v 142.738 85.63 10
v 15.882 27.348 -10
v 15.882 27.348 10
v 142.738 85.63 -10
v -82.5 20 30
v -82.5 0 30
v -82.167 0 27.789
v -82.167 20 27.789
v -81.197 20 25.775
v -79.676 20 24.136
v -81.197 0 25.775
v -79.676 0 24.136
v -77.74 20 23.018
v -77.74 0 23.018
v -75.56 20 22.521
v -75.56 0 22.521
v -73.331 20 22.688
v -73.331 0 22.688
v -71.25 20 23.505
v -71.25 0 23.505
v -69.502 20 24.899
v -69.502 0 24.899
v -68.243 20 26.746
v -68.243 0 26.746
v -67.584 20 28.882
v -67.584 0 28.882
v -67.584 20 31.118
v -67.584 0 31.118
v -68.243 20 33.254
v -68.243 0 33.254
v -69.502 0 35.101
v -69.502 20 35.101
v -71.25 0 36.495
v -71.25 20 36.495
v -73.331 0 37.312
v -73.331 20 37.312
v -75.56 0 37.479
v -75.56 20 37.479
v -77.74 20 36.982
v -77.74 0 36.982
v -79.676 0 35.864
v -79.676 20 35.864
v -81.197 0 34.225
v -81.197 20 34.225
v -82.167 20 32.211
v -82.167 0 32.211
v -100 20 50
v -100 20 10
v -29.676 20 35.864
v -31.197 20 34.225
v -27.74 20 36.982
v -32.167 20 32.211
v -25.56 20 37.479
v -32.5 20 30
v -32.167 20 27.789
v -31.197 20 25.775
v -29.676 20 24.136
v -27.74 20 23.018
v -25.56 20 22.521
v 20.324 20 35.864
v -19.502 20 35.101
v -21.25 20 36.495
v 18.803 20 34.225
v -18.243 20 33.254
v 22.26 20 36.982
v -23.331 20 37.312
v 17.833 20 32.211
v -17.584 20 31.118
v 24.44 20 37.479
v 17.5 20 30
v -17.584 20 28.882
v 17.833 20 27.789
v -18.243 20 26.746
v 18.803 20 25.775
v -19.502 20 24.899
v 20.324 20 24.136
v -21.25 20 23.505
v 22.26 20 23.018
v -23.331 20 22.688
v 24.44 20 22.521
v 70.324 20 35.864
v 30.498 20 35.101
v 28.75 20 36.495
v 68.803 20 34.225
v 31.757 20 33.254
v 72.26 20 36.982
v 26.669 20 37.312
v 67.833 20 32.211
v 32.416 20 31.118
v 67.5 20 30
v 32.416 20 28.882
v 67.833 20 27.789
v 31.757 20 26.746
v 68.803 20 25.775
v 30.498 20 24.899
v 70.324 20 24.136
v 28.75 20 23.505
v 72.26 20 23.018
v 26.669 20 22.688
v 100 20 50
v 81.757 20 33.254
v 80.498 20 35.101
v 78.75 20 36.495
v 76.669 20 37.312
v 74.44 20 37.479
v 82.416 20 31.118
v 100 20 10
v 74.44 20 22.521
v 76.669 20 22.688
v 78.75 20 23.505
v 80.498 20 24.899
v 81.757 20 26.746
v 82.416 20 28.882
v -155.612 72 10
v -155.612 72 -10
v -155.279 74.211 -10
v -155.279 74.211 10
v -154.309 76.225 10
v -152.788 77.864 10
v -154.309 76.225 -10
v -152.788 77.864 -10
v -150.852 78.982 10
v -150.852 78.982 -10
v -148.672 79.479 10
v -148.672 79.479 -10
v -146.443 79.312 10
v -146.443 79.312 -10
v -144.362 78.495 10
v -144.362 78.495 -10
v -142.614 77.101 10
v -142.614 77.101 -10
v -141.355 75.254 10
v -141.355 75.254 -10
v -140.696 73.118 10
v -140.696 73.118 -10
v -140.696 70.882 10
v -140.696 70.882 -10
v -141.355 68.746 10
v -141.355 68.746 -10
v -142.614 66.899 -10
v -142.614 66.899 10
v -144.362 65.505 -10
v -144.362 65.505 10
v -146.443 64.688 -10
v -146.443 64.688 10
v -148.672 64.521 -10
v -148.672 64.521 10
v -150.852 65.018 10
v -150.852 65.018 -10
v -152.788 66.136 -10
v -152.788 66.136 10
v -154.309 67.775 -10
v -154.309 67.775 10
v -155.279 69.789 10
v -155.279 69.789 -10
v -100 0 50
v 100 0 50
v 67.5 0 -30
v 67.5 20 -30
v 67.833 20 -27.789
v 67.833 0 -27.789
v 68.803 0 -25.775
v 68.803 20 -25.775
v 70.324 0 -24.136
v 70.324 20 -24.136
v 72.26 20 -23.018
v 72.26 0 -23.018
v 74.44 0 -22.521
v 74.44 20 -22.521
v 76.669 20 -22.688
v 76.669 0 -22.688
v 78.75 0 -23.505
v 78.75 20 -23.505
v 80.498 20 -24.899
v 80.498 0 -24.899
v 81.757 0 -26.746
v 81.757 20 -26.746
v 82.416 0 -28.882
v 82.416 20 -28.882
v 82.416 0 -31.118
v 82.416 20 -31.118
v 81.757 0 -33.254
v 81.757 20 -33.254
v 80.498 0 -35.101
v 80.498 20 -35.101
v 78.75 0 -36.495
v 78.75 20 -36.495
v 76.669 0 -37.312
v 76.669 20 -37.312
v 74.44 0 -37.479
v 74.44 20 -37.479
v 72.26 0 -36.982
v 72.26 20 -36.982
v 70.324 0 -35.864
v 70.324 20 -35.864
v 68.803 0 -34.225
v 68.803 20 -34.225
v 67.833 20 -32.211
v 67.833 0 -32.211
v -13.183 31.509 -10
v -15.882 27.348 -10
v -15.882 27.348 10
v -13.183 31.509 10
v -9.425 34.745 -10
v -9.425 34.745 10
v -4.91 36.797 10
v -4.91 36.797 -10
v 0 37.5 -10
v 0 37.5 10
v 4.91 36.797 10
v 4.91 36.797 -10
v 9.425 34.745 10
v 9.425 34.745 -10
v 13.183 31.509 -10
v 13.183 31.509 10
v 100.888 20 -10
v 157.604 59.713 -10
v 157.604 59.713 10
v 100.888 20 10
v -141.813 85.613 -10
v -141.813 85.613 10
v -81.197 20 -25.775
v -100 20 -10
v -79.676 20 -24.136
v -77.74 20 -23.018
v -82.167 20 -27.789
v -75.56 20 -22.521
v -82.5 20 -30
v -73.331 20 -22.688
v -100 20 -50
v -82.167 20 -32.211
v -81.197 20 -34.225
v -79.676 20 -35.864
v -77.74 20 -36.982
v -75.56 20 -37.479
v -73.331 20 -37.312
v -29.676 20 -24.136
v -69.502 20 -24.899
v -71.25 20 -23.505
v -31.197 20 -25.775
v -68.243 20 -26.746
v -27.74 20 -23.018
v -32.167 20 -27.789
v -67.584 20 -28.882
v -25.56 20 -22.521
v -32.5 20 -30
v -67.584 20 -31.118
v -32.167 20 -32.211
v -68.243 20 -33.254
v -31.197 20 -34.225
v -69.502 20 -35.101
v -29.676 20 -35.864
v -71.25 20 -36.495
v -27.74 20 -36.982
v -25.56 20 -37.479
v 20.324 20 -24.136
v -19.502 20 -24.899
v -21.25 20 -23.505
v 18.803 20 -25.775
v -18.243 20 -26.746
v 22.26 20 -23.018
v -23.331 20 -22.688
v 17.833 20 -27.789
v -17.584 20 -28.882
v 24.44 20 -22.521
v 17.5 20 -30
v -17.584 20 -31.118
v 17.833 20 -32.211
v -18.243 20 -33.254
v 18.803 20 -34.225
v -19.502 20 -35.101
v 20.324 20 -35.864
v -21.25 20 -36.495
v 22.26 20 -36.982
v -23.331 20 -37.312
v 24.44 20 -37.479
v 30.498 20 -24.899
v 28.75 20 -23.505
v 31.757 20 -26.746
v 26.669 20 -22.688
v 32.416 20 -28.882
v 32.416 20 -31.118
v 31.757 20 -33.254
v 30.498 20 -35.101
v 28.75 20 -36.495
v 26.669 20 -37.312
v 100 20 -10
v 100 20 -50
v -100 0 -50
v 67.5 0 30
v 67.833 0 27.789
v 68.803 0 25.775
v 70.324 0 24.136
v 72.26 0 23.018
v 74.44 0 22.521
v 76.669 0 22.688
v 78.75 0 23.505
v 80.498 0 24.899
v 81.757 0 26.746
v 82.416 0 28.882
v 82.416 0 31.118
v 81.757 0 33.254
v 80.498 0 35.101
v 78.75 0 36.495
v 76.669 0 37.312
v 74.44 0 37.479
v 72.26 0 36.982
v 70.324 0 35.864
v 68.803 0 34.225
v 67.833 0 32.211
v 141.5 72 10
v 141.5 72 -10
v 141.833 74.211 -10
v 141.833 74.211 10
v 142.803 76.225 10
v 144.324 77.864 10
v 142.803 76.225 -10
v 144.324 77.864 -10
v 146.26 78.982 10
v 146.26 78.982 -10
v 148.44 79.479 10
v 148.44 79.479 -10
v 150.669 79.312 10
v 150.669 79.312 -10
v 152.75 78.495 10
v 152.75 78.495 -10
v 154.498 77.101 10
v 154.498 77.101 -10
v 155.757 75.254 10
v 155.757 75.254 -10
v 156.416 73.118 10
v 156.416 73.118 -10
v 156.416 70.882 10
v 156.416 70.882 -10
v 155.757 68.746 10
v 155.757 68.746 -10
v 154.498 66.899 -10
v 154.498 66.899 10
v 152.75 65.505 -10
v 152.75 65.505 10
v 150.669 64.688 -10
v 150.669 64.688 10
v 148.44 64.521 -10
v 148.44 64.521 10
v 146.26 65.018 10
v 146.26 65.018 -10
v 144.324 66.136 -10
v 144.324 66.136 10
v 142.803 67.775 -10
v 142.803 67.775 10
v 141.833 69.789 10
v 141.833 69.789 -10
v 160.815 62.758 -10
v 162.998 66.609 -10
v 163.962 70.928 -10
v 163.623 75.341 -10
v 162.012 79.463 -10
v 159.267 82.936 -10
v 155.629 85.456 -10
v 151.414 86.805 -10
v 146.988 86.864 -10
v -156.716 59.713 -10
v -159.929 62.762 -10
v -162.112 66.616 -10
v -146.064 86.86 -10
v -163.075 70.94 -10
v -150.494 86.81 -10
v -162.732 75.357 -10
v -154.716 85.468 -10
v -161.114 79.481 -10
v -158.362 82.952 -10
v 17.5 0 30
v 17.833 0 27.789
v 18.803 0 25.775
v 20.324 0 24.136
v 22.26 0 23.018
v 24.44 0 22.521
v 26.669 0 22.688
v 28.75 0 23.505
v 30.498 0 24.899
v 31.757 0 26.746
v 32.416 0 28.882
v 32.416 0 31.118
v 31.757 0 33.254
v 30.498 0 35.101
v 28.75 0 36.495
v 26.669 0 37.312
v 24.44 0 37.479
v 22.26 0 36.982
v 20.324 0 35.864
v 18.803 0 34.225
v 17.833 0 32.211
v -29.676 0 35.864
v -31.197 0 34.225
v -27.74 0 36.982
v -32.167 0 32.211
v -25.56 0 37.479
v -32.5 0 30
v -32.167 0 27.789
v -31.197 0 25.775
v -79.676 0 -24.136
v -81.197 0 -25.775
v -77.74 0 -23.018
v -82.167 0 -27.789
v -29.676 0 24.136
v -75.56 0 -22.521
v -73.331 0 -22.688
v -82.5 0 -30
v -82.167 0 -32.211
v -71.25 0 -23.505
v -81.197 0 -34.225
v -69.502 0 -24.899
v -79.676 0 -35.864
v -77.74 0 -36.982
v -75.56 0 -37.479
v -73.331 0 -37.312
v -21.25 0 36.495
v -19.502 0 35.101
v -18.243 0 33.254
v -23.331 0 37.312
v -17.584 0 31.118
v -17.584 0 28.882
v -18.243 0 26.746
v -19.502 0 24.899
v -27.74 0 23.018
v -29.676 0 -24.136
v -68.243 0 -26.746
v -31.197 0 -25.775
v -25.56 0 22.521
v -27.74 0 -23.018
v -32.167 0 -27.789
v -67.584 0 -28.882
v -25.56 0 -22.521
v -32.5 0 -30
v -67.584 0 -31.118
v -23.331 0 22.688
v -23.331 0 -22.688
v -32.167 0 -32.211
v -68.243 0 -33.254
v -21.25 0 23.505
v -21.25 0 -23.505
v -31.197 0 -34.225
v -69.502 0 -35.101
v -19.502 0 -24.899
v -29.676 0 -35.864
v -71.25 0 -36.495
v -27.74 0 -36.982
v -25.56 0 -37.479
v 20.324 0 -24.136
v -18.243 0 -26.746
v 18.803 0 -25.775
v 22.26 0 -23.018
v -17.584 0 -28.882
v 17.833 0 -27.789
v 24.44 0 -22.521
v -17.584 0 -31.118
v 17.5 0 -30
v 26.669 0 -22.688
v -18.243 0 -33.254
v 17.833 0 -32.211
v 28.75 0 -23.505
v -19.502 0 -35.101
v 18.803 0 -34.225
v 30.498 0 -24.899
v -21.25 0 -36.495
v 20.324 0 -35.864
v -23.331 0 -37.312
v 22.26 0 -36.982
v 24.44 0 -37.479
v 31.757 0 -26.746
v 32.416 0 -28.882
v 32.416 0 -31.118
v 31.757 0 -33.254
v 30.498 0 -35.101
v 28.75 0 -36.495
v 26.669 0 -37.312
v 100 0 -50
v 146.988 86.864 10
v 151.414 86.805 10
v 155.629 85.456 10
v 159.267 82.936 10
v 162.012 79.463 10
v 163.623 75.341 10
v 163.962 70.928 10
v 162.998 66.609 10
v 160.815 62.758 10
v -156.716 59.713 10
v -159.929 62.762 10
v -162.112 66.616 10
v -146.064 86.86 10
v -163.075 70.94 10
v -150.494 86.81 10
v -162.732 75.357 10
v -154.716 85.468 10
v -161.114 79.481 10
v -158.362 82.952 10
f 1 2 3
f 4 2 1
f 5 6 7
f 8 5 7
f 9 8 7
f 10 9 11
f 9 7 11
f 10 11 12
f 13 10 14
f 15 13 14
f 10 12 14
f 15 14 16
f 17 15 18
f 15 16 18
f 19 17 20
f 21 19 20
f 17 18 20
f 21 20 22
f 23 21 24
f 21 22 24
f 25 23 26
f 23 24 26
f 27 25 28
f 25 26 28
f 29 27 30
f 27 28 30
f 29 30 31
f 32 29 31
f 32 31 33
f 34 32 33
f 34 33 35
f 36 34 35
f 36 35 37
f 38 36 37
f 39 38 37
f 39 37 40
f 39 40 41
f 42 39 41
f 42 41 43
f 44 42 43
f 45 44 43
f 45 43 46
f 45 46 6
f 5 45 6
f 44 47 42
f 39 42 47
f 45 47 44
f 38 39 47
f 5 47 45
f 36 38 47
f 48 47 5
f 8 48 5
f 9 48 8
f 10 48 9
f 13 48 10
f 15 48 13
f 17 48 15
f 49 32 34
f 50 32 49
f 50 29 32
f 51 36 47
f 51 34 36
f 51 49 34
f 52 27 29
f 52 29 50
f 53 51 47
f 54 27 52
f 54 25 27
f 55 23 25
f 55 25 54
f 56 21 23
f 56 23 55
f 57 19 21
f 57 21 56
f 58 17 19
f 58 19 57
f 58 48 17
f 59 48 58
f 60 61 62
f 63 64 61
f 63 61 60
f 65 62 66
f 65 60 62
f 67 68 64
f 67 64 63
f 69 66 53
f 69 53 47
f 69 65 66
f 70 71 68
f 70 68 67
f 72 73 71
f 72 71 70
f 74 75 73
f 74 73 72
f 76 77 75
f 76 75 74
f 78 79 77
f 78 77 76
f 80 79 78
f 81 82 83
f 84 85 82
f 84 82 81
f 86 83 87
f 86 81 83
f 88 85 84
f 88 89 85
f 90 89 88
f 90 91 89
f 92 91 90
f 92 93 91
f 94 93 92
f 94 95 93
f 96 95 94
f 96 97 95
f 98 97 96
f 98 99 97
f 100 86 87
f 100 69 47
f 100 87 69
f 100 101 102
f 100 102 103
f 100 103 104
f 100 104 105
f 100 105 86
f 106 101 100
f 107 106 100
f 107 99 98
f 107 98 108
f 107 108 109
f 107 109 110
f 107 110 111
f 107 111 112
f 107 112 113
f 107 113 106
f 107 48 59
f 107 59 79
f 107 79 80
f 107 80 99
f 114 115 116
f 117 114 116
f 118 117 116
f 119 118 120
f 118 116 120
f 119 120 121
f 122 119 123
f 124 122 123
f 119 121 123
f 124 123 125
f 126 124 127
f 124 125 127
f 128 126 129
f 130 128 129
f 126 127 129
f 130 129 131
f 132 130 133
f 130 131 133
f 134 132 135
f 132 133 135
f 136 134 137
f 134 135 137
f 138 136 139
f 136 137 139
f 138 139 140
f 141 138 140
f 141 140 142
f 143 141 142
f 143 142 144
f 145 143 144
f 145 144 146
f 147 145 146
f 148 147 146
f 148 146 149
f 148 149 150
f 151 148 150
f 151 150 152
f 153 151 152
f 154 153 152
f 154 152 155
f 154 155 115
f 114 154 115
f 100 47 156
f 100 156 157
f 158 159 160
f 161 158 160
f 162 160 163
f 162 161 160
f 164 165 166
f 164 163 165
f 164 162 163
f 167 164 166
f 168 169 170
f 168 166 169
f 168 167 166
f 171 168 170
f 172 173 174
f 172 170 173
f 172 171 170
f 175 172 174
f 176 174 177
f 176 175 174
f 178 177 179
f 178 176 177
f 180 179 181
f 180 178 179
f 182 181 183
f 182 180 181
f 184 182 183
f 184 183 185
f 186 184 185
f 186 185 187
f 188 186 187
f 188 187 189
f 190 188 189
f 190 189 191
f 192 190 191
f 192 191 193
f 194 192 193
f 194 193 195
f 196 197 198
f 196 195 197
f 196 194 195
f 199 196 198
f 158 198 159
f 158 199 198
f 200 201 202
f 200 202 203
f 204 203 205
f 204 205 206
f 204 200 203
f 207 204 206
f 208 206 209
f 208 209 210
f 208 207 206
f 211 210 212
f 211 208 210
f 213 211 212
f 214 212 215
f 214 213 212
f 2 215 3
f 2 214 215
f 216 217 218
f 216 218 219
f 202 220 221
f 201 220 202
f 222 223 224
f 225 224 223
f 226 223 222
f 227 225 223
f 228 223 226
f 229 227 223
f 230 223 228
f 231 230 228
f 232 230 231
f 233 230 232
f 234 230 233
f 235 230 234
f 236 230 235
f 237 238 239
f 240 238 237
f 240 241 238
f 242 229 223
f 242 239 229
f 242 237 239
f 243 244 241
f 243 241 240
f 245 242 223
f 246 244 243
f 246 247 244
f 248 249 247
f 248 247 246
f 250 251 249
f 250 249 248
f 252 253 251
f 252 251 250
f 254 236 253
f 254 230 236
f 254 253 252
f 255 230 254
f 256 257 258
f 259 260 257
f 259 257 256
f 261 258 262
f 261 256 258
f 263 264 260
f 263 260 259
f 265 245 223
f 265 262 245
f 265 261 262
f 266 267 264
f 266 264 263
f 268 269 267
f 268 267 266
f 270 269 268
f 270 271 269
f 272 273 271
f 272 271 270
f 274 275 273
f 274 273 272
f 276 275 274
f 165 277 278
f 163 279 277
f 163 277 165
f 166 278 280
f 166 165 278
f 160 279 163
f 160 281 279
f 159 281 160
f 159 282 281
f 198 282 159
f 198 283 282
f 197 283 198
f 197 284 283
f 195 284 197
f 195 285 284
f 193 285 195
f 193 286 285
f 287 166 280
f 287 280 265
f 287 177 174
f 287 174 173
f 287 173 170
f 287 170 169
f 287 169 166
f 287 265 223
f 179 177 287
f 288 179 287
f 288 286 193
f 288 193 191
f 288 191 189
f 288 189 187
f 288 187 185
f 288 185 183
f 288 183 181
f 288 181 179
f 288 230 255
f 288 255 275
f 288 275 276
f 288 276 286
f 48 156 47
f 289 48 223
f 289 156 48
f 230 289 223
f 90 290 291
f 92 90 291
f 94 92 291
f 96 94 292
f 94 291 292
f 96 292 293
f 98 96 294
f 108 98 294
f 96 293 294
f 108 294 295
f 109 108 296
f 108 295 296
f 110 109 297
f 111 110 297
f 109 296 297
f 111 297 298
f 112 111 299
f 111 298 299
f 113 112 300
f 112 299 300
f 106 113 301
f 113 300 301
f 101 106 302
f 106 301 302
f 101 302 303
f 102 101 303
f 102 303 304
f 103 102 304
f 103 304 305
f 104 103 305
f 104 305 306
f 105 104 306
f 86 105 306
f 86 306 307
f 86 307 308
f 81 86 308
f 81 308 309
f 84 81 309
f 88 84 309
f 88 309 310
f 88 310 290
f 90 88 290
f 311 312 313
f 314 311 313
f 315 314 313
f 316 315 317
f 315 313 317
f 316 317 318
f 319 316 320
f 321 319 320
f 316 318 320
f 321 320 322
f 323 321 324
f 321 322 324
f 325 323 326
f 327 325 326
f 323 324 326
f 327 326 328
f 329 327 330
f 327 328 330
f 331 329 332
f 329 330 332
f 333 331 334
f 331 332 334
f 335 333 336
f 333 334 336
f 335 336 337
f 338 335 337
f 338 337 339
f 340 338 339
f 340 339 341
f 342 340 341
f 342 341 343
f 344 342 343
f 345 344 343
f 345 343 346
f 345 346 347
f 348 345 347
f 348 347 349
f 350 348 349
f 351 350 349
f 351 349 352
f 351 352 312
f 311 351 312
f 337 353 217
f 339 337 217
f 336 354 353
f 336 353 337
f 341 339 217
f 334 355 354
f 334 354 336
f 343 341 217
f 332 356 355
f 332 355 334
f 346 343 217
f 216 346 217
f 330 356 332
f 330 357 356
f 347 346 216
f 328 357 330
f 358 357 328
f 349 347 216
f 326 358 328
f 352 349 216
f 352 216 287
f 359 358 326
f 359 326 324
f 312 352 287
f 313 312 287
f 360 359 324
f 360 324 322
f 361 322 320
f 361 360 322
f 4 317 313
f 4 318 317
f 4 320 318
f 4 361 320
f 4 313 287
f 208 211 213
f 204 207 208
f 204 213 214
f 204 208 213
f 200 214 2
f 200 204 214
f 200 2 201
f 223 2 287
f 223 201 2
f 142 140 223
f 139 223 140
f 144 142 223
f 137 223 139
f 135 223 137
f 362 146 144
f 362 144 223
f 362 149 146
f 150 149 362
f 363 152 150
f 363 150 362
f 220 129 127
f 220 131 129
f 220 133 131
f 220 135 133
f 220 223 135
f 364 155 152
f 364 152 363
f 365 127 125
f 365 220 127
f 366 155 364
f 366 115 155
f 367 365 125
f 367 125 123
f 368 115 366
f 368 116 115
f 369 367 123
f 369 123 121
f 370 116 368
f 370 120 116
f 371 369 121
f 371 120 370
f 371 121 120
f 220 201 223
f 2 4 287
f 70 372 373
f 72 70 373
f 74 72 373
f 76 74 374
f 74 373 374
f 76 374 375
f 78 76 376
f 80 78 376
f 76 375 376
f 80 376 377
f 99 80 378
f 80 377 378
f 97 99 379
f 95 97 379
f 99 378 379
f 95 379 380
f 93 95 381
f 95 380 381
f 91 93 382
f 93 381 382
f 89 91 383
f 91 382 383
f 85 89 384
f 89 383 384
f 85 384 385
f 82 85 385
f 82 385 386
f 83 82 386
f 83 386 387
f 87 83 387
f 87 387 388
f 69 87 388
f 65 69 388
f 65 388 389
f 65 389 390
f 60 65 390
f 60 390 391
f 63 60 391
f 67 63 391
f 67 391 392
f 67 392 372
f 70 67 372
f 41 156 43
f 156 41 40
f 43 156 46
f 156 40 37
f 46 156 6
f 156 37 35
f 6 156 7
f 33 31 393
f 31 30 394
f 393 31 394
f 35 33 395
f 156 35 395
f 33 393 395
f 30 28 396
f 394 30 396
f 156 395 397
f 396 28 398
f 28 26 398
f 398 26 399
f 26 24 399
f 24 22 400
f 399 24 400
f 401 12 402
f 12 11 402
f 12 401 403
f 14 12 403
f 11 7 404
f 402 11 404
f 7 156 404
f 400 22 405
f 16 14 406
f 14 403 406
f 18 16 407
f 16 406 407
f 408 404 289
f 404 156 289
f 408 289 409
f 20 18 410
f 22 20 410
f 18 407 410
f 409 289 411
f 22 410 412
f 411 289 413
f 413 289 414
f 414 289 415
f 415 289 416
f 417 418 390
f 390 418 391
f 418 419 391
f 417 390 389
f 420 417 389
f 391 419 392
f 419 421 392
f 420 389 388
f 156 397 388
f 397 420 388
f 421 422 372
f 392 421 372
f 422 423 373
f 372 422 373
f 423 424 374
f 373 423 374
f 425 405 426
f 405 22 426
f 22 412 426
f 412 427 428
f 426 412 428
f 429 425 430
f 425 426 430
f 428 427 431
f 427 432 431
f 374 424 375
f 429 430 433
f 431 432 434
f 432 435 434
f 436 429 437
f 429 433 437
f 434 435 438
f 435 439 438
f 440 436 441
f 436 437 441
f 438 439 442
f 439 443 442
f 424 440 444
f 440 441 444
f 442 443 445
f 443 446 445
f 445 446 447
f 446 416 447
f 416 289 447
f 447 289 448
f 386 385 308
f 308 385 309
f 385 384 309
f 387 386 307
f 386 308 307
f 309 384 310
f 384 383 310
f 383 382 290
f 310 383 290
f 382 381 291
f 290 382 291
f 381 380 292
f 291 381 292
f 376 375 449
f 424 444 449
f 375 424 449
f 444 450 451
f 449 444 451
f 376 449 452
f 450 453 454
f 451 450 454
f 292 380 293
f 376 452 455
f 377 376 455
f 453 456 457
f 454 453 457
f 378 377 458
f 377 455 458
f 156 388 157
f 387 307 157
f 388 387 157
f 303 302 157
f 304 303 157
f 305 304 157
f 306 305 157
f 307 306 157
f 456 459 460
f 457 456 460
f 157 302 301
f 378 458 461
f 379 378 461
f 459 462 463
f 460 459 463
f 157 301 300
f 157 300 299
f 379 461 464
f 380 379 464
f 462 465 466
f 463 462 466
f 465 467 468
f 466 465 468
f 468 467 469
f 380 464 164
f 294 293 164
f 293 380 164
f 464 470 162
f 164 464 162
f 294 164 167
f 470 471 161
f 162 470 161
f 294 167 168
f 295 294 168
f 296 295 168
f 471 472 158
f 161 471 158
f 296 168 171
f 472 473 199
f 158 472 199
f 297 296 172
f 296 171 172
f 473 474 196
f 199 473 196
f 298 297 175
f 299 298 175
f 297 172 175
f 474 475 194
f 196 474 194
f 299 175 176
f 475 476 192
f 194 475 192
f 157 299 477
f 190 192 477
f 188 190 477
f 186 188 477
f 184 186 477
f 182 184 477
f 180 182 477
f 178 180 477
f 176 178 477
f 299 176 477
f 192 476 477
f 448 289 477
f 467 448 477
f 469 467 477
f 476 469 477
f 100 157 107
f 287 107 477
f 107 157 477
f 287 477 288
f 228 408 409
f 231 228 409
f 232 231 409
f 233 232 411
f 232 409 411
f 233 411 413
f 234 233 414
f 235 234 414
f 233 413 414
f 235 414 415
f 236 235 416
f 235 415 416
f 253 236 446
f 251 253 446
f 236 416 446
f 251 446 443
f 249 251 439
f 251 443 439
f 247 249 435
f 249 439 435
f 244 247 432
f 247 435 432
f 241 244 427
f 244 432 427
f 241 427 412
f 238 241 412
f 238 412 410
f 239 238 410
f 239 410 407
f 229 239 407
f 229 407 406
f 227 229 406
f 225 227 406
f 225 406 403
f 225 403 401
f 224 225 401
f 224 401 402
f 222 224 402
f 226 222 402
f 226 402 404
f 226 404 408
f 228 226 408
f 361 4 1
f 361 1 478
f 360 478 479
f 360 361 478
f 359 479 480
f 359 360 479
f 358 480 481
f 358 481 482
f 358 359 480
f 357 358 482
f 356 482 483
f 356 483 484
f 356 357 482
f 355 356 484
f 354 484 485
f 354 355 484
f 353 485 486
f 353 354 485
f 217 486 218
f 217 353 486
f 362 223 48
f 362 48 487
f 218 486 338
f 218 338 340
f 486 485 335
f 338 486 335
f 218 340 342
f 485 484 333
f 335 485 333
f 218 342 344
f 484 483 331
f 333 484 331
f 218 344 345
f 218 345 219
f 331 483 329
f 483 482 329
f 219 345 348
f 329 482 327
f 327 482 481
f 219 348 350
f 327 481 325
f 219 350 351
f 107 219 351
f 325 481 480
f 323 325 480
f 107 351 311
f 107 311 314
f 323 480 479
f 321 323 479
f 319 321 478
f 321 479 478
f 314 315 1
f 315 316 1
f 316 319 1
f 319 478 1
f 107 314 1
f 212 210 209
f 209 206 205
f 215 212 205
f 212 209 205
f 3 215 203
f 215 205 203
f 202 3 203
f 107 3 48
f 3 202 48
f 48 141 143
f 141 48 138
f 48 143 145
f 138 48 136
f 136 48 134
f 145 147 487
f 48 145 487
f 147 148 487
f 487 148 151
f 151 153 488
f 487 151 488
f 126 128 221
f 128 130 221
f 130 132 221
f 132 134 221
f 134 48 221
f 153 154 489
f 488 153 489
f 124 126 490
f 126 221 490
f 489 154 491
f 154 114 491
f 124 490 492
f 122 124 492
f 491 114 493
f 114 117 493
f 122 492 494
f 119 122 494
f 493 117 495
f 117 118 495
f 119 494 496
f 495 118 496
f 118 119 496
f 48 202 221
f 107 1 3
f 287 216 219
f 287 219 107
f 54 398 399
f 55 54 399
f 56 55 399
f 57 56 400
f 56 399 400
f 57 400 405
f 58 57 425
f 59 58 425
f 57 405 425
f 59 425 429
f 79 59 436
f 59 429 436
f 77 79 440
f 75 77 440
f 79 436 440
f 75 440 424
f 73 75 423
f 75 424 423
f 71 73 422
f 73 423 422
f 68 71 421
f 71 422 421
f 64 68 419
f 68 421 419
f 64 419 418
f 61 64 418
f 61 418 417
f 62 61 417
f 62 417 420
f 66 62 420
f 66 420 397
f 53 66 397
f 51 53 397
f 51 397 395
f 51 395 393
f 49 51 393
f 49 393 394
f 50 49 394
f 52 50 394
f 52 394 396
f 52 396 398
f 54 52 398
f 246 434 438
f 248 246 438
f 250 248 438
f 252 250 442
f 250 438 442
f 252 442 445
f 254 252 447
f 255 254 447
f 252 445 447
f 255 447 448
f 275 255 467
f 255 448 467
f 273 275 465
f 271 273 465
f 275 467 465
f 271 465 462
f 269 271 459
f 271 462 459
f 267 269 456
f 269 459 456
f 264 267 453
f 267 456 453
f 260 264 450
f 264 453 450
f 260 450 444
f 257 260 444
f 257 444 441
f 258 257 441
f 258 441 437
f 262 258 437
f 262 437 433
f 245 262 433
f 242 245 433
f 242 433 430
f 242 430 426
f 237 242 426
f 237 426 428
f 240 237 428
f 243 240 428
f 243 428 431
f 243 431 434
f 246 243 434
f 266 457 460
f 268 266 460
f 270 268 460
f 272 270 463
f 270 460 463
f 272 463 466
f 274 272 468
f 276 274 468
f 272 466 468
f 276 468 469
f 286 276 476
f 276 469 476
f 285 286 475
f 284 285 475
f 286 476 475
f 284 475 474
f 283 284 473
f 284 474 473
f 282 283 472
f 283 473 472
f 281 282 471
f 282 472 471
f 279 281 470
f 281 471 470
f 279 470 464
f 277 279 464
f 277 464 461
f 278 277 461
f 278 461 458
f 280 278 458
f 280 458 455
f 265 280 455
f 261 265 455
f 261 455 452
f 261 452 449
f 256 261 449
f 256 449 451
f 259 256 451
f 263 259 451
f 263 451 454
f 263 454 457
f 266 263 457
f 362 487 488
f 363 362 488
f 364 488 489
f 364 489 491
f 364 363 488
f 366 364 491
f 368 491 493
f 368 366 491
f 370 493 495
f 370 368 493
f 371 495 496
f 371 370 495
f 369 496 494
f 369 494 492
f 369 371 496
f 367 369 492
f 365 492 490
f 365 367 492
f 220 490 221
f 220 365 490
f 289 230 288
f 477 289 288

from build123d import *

# Parameters (mm, degrees)
BOSS_EXTRUDE1_DEPTH      = 50
BOSS_EXTRUDE1_DEPTH_BACK = 50
SKETCH1_W                = 200
SKETCH1_H                = 20
BOSS_EXTRUDE2_DEPTH      = 10
BOSS_EXTRUDE2_DEPTH_BACK = 10
HOLE1_D                  = 15
HOLE2_D                  = 15
LPATTERN1_COUNT          = 4
LPATTERN1_PITCH          = 50
MIRROR1_COPY_1_D         = 15
MIRROR1_COPY_2_D         = 15
MIRROR1_COPY_3_D         = 15


with BuildPart() as part:
    # Sketch1 → Boss-Extrude1 (new, two sides: drawn at the far end of the back side and taken through both)
    with BuildSketch(Plane.XY.offset(-BOSS_EXTRUDE1_DEPTH_BACK)):
        with Locations((0, 10)):
            Rectangle(SKETCH1_W, SKETCH1_H)
    extrude(amount=BOSS_EXTRUDE1_DEPTH + BOSS_EXTRUDE1_DEPTH_BACK)

    # Sketch2 → Boss-Extrude2 (add, two sides: drawn at the far end of the back side and taken through both)
    with BuildSketch(Plane.XY.offset(-BOSS_EXTRUDE2_DEPTH_BACK)):
        with BuildLine():
            Line((-141.813369554, 85.613497892), (-15.882414207, 27.348395672))
            ThreePointArc((-15.882414207, 27.348395672), (0, 37.5), (15.882414207, 27.348395672))
            Line((15.882414207, 27.348395672), (142.737764558, 85.630275392))
            ThreePointArc((142.737764558, 85.630275392), (162.01155177, 79.46321114), (157.603646545, 59.712719336))
            Line((157.603646545, 59.712719336), (100.888005584, 20))
            Line((100.888005584, 20), (-100, 20))
            Line((-100, 20), (-156.715640962, 59.712719336))
            ThreePointArc((-156.715640962, 59.712719336), (-161.113566002, 79.480583955), (-141.813369554, 85.613497892))
        make_face()
    extrude(amount=BOSS_EXTRUDE2_DEPTH + BOSS_EXTRUDE2_DEPTH_BACK)

    # Hole1 (through all)
    with Locations(Plane.XY.offset(10)):
        with Locations((-148.111994416, 72), (149, 72)):
            Hole(HOLE1_D / 2)

    # Hole2 (through all)
    with Locations(Plane(origin=(0, 20, 0), x_dir=(1, 0, 0), z_dir=(0, 1, 0))):
        with Locations((75, -30)):
            hole2 = Hole(HOLE2_D / 2)

    # LPattern1: Hole2 ×4
    with Locations(*[(-i * LPATTERN1_PITCH, 0, 0) for i in range(1, LPATTERN1_COUNT)]):
        add(hole2, mode=Mode.SUBTRACT)

    # Mirror1: Hole2 across plane
    add(hole2.mirror(Plane.XY), mode=Mode.SUBTRACT)

    # Mirror1 copy 1 (through all)
    with Locations(Plane(origin=(-50, 20, 0), x_dir=(1, 0, 0), z_dir=(0, 1, 0))):
        with Locations((75, 30)):
            Hole(MIRROR1_COPY_1_D / 2)

    # Mirror1 copy 2 (through all)
    with Locations(Plane(origin=(-100, 20, 0), x_dir=(1, 0, 0), z_dir=(0, 1, 0))):
        with Locations((75, 30)):
            Hole(MIRROR1_COPY_2_D / 2)

    # Mirror1 copy 3 (through all)
    with Locations(Plane(origin=(-150, 20, 0), x_dir=(1, 0, 0), z_dir=(0, 1, 0))):
        with Locations((75, 30)):
            Hole(MIRROR1_COPY_3_D / 2)


solid = part.part
